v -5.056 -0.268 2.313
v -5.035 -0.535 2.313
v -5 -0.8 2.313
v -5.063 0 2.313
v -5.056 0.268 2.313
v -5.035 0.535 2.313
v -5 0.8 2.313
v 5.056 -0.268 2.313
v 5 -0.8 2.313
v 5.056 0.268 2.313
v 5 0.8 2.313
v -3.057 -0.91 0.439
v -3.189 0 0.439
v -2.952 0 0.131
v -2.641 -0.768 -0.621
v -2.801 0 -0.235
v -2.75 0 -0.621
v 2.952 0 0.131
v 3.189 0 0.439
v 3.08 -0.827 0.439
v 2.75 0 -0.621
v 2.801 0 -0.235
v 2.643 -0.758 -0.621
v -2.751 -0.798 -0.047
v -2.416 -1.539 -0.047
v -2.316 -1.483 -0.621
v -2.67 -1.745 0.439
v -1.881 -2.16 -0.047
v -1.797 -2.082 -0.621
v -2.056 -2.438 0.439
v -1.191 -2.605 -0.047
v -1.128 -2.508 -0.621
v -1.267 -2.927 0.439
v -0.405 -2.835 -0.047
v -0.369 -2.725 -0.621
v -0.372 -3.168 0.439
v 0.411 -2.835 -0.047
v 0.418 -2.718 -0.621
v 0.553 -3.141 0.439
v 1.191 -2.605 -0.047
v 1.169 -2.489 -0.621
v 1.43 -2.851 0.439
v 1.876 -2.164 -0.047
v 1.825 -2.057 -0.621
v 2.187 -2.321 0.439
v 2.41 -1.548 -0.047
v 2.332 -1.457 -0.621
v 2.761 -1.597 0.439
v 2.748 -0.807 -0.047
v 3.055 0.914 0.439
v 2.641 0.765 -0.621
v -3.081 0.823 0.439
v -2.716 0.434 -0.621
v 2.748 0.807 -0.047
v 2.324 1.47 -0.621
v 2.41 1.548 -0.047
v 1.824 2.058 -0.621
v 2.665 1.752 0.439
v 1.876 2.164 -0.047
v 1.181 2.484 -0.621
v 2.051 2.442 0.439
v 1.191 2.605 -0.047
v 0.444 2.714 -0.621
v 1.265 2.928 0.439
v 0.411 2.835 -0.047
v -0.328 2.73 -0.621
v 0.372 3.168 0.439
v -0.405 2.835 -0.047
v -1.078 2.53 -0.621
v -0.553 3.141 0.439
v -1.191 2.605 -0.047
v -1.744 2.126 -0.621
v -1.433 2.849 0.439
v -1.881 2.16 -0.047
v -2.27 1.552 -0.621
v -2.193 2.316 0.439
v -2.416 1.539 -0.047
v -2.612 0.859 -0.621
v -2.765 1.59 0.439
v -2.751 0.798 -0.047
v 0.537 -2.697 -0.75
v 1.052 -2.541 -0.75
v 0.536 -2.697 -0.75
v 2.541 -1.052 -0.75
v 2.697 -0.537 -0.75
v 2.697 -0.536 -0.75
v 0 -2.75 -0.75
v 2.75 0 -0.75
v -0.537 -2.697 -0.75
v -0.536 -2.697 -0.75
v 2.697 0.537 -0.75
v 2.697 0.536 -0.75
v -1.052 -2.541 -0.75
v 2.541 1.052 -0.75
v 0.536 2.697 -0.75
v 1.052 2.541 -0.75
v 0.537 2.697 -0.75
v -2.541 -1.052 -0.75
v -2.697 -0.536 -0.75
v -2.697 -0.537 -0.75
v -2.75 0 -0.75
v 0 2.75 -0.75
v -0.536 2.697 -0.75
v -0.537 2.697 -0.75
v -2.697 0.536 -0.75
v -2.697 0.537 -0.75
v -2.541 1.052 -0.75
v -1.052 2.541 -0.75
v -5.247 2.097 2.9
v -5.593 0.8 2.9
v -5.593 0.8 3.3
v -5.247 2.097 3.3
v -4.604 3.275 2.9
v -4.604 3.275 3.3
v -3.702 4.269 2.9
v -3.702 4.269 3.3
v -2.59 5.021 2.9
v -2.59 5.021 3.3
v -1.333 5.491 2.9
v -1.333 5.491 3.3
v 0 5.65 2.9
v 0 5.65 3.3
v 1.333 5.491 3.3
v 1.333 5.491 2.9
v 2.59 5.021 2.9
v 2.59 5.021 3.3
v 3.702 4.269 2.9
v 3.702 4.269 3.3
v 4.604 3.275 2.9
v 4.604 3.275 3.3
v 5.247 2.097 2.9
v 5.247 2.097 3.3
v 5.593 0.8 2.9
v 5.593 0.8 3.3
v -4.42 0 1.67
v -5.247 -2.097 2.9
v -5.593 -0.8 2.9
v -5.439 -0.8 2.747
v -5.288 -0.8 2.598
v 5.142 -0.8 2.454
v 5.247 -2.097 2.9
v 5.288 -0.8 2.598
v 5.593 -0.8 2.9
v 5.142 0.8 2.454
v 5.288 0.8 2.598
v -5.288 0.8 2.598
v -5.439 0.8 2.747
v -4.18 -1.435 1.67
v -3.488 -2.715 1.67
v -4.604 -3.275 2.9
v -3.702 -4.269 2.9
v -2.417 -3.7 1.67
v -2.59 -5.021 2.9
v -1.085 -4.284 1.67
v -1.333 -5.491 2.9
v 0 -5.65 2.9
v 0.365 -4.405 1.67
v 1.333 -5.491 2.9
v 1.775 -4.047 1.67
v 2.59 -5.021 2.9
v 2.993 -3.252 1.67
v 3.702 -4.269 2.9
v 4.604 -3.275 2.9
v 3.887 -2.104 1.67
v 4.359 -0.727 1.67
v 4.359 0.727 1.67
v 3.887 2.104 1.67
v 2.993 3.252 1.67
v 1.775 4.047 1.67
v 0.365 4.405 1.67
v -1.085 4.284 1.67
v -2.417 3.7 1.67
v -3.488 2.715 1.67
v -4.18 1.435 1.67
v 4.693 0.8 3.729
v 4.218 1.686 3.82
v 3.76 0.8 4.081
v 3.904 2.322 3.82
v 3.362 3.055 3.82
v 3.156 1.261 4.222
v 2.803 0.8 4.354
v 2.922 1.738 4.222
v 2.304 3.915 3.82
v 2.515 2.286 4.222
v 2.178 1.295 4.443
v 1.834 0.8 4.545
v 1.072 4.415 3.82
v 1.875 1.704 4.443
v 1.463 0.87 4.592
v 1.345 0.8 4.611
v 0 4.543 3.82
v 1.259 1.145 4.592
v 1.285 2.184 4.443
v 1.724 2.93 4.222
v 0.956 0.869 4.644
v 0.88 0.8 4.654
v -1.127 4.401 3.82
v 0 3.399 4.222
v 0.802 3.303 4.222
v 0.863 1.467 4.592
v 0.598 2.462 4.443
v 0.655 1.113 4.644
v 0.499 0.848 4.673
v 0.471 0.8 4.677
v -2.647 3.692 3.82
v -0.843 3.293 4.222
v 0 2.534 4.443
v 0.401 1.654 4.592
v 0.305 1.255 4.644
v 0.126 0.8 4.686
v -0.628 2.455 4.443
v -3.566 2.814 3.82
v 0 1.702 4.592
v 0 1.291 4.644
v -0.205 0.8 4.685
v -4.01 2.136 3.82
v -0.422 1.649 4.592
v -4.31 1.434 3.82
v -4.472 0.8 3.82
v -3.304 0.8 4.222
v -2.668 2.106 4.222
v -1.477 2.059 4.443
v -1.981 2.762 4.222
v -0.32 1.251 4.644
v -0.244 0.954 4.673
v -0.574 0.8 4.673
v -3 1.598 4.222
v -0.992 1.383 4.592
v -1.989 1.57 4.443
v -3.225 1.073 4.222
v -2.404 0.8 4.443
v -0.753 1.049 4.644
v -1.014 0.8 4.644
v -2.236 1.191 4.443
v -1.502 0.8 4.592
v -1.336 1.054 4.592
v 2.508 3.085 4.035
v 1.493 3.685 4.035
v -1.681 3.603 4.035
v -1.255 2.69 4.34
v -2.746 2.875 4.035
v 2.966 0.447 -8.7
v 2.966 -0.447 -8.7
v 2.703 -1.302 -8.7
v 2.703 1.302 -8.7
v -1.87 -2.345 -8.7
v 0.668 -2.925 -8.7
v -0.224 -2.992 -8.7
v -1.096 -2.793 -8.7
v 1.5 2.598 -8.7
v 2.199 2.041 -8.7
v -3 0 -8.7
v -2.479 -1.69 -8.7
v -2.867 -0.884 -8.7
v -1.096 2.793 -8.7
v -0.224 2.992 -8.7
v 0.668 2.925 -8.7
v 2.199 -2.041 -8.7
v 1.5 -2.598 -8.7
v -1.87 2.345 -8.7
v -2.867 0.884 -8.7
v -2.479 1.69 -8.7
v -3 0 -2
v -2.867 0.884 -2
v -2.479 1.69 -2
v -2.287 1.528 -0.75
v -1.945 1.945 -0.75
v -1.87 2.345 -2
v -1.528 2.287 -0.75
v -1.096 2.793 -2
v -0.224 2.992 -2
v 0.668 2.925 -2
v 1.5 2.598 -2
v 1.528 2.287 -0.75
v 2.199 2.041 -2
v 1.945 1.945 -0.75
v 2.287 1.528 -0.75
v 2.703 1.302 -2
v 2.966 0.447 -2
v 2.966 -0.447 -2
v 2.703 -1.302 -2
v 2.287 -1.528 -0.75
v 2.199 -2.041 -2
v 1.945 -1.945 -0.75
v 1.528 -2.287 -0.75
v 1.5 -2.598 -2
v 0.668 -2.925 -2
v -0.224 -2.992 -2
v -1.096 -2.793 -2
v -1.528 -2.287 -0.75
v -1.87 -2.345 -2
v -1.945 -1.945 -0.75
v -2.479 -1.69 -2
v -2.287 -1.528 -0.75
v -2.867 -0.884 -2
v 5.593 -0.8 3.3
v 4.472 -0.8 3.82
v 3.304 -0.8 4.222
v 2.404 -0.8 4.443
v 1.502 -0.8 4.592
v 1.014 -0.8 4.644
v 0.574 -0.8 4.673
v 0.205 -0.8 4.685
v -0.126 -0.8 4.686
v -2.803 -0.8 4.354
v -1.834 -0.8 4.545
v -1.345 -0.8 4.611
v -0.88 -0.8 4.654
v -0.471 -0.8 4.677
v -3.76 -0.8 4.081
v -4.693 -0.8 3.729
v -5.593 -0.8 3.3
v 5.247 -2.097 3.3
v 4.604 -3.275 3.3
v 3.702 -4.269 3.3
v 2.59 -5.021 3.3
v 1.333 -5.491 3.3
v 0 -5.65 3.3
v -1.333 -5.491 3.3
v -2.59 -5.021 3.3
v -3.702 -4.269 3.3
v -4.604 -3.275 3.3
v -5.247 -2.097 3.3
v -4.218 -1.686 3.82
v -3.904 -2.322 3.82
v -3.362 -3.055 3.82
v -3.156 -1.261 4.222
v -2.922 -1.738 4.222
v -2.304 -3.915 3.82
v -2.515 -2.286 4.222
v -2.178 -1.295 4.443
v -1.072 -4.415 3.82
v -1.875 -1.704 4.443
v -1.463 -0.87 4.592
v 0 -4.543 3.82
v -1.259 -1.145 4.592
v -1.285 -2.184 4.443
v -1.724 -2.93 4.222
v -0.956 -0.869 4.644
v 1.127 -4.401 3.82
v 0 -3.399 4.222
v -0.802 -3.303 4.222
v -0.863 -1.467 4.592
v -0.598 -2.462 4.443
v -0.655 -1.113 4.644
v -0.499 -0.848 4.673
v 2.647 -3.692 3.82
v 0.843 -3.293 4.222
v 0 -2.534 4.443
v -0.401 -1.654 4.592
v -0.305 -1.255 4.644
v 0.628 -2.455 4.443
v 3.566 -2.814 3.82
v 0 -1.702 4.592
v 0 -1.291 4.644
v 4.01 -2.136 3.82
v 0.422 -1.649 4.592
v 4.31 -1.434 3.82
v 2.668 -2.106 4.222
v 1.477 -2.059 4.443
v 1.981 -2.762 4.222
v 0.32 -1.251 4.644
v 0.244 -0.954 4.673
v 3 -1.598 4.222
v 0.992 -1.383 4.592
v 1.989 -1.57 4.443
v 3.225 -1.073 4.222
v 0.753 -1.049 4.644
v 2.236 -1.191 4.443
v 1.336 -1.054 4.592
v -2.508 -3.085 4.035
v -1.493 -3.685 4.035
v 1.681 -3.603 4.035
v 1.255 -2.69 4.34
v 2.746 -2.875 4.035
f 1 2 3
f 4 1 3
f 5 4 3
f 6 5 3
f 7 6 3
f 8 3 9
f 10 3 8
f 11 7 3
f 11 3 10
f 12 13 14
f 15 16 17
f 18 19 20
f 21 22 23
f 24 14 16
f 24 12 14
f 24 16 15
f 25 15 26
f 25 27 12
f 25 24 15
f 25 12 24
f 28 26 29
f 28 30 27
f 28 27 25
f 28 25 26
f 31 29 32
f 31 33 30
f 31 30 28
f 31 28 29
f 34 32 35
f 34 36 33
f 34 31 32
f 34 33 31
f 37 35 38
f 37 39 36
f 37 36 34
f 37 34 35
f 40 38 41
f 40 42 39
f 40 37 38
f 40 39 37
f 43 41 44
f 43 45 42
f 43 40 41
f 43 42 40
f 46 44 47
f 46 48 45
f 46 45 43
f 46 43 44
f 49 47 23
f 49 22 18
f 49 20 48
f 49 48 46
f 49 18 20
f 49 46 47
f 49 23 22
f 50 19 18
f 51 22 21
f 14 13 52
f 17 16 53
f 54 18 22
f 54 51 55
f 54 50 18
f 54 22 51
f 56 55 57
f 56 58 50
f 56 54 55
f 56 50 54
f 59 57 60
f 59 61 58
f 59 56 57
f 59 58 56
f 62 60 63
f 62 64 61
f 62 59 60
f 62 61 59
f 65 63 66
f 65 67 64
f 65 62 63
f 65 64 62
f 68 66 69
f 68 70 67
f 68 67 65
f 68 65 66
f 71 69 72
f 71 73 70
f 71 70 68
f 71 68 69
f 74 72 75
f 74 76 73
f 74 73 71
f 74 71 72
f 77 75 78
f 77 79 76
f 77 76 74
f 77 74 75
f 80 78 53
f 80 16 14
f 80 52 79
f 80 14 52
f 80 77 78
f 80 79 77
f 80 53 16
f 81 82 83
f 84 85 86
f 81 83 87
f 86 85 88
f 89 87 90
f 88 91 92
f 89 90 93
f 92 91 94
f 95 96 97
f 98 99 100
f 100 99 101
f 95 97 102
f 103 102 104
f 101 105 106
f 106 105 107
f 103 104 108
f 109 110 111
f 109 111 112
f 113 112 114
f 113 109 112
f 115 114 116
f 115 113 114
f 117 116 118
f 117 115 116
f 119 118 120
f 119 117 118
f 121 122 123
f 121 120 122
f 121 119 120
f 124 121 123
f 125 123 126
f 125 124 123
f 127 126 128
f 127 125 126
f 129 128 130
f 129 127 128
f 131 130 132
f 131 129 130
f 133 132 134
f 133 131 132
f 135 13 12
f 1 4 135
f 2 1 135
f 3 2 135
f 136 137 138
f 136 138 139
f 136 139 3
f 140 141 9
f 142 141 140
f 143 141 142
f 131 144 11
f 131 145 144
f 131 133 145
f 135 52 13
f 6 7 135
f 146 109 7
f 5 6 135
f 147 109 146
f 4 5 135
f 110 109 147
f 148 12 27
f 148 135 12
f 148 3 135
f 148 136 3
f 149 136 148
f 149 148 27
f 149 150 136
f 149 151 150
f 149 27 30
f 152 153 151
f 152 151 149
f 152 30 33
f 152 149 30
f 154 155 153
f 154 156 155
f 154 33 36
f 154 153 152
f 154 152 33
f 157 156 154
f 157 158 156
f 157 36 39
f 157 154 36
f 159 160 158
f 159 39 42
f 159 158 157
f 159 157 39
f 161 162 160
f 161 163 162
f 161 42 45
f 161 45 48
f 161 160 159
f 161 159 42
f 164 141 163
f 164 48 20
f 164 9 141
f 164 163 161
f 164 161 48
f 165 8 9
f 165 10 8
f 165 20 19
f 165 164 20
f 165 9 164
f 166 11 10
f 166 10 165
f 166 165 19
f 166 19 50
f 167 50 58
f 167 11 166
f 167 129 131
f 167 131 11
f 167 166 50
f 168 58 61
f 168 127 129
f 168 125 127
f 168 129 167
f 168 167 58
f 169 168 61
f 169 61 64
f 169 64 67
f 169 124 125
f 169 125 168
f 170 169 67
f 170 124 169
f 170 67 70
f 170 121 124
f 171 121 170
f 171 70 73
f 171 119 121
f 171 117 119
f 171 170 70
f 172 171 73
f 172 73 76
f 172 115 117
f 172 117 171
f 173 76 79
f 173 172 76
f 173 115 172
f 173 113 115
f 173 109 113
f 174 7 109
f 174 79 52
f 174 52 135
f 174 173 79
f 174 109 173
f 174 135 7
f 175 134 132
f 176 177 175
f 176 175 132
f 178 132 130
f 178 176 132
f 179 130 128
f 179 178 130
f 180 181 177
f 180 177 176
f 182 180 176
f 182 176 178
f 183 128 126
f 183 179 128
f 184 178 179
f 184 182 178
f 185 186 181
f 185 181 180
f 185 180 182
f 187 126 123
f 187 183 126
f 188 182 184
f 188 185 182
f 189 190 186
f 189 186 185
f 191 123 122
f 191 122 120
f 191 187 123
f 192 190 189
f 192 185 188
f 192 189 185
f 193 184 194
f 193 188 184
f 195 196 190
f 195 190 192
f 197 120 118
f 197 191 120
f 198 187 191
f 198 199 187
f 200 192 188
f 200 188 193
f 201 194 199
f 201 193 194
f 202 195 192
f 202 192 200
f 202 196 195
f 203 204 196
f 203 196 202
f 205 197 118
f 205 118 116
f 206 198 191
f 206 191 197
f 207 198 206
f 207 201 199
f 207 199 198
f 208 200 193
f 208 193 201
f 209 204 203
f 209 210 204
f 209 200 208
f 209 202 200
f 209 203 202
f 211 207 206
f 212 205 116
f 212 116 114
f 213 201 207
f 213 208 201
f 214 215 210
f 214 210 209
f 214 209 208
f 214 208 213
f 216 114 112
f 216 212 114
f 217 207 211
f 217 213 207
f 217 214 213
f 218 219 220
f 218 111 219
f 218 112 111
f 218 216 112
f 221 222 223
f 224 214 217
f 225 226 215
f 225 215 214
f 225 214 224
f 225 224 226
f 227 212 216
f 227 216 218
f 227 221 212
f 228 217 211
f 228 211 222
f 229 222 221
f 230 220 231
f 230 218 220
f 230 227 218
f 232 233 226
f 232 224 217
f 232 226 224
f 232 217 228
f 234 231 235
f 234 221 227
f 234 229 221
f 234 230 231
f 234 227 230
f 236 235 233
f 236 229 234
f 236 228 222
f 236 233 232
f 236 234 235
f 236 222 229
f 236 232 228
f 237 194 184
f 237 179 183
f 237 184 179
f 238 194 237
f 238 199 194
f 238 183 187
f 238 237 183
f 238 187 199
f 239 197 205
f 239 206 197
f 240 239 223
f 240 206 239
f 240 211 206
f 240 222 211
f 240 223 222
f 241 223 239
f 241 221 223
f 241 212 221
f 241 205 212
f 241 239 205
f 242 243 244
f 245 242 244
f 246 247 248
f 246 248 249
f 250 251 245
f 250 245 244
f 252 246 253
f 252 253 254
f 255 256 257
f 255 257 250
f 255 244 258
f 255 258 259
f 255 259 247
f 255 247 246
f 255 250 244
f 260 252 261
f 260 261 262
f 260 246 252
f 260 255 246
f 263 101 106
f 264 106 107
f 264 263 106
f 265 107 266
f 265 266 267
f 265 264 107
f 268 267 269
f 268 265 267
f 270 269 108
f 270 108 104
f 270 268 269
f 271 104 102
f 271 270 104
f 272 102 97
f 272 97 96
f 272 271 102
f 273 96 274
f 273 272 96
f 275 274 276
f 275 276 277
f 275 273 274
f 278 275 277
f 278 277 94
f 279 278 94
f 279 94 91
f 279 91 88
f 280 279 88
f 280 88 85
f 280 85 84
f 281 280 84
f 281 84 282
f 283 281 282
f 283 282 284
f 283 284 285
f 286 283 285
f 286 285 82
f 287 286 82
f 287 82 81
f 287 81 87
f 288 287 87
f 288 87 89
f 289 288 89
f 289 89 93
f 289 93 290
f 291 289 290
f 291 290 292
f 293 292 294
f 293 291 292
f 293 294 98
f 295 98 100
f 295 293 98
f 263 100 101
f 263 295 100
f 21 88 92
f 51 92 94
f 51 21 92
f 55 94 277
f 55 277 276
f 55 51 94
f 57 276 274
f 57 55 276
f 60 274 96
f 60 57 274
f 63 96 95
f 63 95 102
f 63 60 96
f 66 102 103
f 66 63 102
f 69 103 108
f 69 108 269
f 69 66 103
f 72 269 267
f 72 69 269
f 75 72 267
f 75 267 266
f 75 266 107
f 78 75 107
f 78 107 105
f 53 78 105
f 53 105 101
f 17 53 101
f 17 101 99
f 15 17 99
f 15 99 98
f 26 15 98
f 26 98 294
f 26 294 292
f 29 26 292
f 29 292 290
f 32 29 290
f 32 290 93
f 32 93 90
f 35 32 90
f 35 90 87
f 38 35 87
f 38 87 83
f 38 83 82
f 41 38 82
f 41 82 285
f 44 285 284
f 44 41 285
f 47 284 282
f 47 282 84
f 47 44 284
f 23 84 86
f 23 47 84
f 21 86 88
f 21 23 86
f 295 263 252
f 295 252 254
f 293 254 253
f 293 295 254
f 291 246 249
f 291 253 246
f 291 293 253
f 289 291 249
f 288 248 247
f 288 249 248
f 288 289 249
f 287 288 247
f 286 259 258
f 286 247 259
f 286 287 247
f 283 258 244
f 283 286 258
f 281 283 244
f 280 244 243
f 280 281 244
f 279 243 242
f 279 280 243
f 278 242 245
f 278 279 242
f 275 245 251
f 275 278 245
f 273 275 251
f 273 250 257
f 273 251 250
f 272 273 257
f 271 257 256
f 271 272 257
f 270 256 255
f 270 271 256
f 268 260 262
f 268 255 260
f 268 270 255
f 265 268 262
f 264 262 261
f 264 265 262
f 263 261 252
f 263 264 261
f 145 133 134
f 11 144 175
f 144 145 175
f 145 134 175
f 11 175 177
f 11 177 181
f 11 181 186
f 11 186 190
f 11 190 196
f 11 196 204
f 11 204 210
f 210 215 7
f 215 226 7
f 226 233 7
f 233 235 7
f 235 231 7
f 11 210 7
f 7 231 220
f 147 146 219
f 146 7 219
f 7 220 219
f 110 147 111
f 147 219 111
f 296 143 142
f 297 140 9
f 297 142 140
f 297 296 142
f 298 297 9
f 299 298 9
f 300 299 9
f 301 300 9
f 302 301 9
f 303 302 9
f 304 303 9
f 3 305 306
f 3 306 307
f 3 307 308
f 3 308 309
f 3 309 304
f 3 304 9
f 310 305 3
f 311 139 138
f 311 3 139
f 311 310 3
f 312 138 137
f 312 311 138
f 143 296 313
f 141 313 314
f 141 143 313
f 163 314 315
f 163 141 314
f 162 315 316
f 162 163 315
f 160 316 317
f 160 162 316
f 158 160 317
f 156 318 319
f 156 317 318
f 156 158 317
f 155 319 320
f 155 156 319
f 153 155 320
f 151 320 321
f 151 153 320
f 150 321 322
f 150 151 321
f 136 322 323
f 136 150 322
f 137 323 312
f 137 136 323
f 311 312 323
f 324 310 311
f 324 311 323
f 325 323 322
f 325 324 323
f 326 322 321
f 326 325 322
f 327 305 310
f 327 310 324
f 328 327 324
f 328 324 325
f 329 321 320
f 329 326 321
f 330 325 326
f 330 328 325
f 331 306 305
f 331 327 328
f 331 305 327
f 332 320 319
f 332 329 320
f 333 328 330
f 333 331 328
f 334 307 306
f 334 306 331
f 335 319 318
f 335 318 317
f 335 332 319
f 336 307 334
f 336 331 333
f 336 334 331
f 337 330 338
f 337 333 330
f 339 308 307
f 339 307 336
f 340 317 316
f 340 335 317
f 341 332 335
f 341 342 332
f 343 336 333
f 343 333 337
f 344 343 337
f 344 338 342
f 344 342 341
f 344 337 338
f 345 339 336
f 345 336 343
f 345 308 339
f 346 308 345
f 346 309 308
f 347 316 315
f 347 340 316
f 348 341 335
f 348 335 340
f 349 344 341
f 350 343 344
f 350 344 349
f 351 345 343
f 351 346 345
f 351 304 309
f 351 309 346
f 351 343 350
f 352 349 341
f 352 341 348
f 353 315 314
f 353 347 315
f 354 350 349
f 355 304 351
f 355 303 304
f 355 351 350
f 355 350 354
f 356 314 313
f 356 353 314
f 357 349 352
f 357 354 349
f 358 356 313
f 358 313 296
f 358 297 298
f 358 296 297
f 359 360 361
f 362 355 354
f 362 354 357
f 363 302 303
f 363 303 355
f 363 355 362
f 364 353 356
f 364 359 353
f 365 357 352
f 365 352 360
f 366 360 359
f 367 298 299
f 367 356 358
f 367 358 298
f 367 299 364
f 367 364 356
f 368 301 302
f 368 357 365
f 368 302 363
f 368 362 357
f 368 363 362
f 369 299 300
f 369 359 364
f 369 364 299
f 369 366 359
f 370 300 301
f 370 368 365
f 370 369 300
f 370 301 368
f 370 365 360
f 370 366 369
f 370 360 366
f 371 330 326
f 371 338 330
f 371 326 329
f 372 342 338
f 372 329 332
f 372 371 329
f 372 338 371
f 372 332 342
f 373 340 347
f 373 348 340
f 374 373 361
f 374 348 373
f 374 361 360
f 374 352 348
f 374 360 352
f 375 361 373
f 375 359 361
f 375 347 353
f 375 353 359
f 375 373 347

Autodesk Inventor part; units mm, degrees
ref_plane "WorkPlane11" through (0, 0, 0) normal (0, 0, 1) x (1, 0, 0)
ref_plane "Work Plane2" through (0, 0, -5.7) normal (0, 0, 1) x (1, 0, 0)
ref_plane "WorkPlane9" through (0, 0, 8.3) normal (0, 0, 1) x (1, 0, 0)
sketch "Sketch1" plane through (0, 0, 0) normal (0, 0, 1) x (1, 0, 0)
  point P0 (0, 0)
sketch "Sketch2" plane through (0, 0, 0) normal (0, 0, 1) x (1, 0, 0)
  circle A0 centre (0, 0) radius 2.75
  dimension "d2" = 5.5
extrude "Extrusion1" add sketch "Sketch2" against normal blind 0.75
sketch "Sketch3" plane through (0, 0, -0.75) normal (0, 0, -1) x (-1, 0, 0)
  circle A0 centre (0, 0) radius 3
  circle A1 centre (0, 0) radius 2.75 construction
  dimension "d8" = 6
extrude "Extrusion2" add sketch "Sketch3" along normal blind 7.95
sketch "Sketch4" plane through (0, 0, 0) normal (0, 0, 1) x (1, 0, 0)
  circle A0 centre (0, 0) radius 5.65
  circle A1 centre (0, 0) radius 2.75 construction
  dimension "d12" = 11.3
extrude "Extrusion3" add sketch "Sketch4" along normal blind 3.3
sketch "Sketch5" plane through (0, 0, 0) normal (0, 1, 0) x (-1, 0, 0)
  line L0 (5.65, 0) -> (2.75, 0)
  line L1 (5.65, 2.9) -> (5.65, 0)
  line L2 (2.75, 0) -> (5.65, 2.9)
  line L3 (-5.65, 0) -> (5.65, 0) construction
  line L4 (0, -7.649262) -> (0, 5.899262)
  line L5 (0, -10.358967) -> (0, 8.608967)
  line L6 (5.65, 0) -> (5.65, 3.3)
  line L7 (-4.75, 0) -> (4.75, 0)
  line L8 (2.75, 0) -> (2.75, -0.75)
  dimension "d17" = 45
revolve "Revolution1" cut sketch "Sketch5" angle 360 about axis through (0, 0, -7.649262) along (0, 0, 1)
sketch "Sketch6" plane through (0, 0, 0) normal (0, 1, 0) x (-1, 0, 0)
  line L0 (0, 3.3) -> (0, 4.713334)
  line L1 (0, 3.3) -> (5.65, 3.3)
  arc A0 (5.65, 3.3) -> (0, 4.713334) centre (0, -7.286666) ccw
  line L2 (-5.65, 3.3) -> (5.65, 3.3) construction
  line L3 (0, -7.649262) -> (0, 5.899262)
  line L4 (0, -10.358967) -> (0, 8.608967)
  line L5 (5.65, 2.9) -> (5.65, 3.3)
  arc A1 (0, 4.713334) -> (-5.65, 3.3) centre (0, -7.286666) ccw
  dimension "d20" = 12
  dimension "d24" = 5.65
revolve "Revolution2" add sketch "Sketch6" angle 360 about axis through (0, 0, -7.649262) along (0, 0, 1)
fillet "Fillet1" radius 1.5 2 edges at (0, 2.75, 0) (0, -2.75, 0)
chamfer "Chamfer1" distance 1.25 distance2 0.25 1 edges at (3, 0, -0.75) measured on face at (-2.9612, -0.4812, -6.05)
sketch "Sketch8" plane through (0, 0, 0) normal (0, 1, 0) x (-1, 0, 0)
  line L0 (-5.65, 4.713334) -> (5.65, 4.713334)
  line L1 (5.65, 4.713334) -> (5.65, 2.313334)
  line L2 (5.65, 2.313334) -> (-5.65, 2.313334)
  line L3 (-5.65, 2.313334) -> (-5.65, 4.713334)
  arc A0 (5.65, 3.3) -> (-5.65, 3.3) centre (0, -7.286666) ccw
  line L4 (-5.65, 2.9) -> (-5.65, 3.3)
  line L5 (5.65, 2.9) -> (5.65, 3.3)
  dimension "msp_d31" = 2.4
extrude "Extrusion4" cut sketch "Sketch8" against normal mid plane 1.6
thread "Thread1" size "M6x1" class "6g" standard "ISO Metric profile" full length
ref_plane "MSC_PF1" through (0, 0, 0) normal (1, 0, 0) x (0, 1, 0)
ref_plane "MSC_PT1" through (-5.65, 0, 2.9) normal (0, 0, -1) x (-1, 0, 0)
equation "\"d28\" = r"
equation "\"d29\" = msp_x"
equation "\"d30\" = 0.25 * PTC"
equation "\"d3\" = -msp_x + ParA"
equation "\"d8\" = NND"
equation "\"d9\" = msp_x - ParK + NLG - ParA"
equation "\"d12\" = Dk"
equation "\"d13\" = ParK"
equation "\"msp_d31\" = ParT"
equation "\"msp_d32\" = ParN"
equation "\"d2\" = 0.5 * PTC + msp_mdtds"
equation "\"d20\" = rf"
equation "\"d24\" = 0.5 * Dk"
equation "\"PTC\" = 1"
equation "\"NND\" = 6"
equation "\"msp_x\" = 1.25 * PTC"
equation "\"NLG\" = 12"
equation "\"msp_mdtds\" = NND - PTC"
equation "\"ParK\" = 3.3"
equation "\"ParN\" = 1.6"
equation "\"ParT\" = 2.4"
equation "\"r\" = 1.5"
equation "\"prf_c\" = 0"
equation "\"ParA\" = 2"
equation "\"Dk\" = 11.3"
equation "\"rf\" = 12"
equation "\"ParF\" = 1.4"
equation "\"THREADDIA\" = NND"
equation "\"PG\" = 1.2345"
equation "\"TEMPLATE\" = 1.2345"
properties part number "ISO 2010 - M6x12" material "Stainless Steel, 440C"
